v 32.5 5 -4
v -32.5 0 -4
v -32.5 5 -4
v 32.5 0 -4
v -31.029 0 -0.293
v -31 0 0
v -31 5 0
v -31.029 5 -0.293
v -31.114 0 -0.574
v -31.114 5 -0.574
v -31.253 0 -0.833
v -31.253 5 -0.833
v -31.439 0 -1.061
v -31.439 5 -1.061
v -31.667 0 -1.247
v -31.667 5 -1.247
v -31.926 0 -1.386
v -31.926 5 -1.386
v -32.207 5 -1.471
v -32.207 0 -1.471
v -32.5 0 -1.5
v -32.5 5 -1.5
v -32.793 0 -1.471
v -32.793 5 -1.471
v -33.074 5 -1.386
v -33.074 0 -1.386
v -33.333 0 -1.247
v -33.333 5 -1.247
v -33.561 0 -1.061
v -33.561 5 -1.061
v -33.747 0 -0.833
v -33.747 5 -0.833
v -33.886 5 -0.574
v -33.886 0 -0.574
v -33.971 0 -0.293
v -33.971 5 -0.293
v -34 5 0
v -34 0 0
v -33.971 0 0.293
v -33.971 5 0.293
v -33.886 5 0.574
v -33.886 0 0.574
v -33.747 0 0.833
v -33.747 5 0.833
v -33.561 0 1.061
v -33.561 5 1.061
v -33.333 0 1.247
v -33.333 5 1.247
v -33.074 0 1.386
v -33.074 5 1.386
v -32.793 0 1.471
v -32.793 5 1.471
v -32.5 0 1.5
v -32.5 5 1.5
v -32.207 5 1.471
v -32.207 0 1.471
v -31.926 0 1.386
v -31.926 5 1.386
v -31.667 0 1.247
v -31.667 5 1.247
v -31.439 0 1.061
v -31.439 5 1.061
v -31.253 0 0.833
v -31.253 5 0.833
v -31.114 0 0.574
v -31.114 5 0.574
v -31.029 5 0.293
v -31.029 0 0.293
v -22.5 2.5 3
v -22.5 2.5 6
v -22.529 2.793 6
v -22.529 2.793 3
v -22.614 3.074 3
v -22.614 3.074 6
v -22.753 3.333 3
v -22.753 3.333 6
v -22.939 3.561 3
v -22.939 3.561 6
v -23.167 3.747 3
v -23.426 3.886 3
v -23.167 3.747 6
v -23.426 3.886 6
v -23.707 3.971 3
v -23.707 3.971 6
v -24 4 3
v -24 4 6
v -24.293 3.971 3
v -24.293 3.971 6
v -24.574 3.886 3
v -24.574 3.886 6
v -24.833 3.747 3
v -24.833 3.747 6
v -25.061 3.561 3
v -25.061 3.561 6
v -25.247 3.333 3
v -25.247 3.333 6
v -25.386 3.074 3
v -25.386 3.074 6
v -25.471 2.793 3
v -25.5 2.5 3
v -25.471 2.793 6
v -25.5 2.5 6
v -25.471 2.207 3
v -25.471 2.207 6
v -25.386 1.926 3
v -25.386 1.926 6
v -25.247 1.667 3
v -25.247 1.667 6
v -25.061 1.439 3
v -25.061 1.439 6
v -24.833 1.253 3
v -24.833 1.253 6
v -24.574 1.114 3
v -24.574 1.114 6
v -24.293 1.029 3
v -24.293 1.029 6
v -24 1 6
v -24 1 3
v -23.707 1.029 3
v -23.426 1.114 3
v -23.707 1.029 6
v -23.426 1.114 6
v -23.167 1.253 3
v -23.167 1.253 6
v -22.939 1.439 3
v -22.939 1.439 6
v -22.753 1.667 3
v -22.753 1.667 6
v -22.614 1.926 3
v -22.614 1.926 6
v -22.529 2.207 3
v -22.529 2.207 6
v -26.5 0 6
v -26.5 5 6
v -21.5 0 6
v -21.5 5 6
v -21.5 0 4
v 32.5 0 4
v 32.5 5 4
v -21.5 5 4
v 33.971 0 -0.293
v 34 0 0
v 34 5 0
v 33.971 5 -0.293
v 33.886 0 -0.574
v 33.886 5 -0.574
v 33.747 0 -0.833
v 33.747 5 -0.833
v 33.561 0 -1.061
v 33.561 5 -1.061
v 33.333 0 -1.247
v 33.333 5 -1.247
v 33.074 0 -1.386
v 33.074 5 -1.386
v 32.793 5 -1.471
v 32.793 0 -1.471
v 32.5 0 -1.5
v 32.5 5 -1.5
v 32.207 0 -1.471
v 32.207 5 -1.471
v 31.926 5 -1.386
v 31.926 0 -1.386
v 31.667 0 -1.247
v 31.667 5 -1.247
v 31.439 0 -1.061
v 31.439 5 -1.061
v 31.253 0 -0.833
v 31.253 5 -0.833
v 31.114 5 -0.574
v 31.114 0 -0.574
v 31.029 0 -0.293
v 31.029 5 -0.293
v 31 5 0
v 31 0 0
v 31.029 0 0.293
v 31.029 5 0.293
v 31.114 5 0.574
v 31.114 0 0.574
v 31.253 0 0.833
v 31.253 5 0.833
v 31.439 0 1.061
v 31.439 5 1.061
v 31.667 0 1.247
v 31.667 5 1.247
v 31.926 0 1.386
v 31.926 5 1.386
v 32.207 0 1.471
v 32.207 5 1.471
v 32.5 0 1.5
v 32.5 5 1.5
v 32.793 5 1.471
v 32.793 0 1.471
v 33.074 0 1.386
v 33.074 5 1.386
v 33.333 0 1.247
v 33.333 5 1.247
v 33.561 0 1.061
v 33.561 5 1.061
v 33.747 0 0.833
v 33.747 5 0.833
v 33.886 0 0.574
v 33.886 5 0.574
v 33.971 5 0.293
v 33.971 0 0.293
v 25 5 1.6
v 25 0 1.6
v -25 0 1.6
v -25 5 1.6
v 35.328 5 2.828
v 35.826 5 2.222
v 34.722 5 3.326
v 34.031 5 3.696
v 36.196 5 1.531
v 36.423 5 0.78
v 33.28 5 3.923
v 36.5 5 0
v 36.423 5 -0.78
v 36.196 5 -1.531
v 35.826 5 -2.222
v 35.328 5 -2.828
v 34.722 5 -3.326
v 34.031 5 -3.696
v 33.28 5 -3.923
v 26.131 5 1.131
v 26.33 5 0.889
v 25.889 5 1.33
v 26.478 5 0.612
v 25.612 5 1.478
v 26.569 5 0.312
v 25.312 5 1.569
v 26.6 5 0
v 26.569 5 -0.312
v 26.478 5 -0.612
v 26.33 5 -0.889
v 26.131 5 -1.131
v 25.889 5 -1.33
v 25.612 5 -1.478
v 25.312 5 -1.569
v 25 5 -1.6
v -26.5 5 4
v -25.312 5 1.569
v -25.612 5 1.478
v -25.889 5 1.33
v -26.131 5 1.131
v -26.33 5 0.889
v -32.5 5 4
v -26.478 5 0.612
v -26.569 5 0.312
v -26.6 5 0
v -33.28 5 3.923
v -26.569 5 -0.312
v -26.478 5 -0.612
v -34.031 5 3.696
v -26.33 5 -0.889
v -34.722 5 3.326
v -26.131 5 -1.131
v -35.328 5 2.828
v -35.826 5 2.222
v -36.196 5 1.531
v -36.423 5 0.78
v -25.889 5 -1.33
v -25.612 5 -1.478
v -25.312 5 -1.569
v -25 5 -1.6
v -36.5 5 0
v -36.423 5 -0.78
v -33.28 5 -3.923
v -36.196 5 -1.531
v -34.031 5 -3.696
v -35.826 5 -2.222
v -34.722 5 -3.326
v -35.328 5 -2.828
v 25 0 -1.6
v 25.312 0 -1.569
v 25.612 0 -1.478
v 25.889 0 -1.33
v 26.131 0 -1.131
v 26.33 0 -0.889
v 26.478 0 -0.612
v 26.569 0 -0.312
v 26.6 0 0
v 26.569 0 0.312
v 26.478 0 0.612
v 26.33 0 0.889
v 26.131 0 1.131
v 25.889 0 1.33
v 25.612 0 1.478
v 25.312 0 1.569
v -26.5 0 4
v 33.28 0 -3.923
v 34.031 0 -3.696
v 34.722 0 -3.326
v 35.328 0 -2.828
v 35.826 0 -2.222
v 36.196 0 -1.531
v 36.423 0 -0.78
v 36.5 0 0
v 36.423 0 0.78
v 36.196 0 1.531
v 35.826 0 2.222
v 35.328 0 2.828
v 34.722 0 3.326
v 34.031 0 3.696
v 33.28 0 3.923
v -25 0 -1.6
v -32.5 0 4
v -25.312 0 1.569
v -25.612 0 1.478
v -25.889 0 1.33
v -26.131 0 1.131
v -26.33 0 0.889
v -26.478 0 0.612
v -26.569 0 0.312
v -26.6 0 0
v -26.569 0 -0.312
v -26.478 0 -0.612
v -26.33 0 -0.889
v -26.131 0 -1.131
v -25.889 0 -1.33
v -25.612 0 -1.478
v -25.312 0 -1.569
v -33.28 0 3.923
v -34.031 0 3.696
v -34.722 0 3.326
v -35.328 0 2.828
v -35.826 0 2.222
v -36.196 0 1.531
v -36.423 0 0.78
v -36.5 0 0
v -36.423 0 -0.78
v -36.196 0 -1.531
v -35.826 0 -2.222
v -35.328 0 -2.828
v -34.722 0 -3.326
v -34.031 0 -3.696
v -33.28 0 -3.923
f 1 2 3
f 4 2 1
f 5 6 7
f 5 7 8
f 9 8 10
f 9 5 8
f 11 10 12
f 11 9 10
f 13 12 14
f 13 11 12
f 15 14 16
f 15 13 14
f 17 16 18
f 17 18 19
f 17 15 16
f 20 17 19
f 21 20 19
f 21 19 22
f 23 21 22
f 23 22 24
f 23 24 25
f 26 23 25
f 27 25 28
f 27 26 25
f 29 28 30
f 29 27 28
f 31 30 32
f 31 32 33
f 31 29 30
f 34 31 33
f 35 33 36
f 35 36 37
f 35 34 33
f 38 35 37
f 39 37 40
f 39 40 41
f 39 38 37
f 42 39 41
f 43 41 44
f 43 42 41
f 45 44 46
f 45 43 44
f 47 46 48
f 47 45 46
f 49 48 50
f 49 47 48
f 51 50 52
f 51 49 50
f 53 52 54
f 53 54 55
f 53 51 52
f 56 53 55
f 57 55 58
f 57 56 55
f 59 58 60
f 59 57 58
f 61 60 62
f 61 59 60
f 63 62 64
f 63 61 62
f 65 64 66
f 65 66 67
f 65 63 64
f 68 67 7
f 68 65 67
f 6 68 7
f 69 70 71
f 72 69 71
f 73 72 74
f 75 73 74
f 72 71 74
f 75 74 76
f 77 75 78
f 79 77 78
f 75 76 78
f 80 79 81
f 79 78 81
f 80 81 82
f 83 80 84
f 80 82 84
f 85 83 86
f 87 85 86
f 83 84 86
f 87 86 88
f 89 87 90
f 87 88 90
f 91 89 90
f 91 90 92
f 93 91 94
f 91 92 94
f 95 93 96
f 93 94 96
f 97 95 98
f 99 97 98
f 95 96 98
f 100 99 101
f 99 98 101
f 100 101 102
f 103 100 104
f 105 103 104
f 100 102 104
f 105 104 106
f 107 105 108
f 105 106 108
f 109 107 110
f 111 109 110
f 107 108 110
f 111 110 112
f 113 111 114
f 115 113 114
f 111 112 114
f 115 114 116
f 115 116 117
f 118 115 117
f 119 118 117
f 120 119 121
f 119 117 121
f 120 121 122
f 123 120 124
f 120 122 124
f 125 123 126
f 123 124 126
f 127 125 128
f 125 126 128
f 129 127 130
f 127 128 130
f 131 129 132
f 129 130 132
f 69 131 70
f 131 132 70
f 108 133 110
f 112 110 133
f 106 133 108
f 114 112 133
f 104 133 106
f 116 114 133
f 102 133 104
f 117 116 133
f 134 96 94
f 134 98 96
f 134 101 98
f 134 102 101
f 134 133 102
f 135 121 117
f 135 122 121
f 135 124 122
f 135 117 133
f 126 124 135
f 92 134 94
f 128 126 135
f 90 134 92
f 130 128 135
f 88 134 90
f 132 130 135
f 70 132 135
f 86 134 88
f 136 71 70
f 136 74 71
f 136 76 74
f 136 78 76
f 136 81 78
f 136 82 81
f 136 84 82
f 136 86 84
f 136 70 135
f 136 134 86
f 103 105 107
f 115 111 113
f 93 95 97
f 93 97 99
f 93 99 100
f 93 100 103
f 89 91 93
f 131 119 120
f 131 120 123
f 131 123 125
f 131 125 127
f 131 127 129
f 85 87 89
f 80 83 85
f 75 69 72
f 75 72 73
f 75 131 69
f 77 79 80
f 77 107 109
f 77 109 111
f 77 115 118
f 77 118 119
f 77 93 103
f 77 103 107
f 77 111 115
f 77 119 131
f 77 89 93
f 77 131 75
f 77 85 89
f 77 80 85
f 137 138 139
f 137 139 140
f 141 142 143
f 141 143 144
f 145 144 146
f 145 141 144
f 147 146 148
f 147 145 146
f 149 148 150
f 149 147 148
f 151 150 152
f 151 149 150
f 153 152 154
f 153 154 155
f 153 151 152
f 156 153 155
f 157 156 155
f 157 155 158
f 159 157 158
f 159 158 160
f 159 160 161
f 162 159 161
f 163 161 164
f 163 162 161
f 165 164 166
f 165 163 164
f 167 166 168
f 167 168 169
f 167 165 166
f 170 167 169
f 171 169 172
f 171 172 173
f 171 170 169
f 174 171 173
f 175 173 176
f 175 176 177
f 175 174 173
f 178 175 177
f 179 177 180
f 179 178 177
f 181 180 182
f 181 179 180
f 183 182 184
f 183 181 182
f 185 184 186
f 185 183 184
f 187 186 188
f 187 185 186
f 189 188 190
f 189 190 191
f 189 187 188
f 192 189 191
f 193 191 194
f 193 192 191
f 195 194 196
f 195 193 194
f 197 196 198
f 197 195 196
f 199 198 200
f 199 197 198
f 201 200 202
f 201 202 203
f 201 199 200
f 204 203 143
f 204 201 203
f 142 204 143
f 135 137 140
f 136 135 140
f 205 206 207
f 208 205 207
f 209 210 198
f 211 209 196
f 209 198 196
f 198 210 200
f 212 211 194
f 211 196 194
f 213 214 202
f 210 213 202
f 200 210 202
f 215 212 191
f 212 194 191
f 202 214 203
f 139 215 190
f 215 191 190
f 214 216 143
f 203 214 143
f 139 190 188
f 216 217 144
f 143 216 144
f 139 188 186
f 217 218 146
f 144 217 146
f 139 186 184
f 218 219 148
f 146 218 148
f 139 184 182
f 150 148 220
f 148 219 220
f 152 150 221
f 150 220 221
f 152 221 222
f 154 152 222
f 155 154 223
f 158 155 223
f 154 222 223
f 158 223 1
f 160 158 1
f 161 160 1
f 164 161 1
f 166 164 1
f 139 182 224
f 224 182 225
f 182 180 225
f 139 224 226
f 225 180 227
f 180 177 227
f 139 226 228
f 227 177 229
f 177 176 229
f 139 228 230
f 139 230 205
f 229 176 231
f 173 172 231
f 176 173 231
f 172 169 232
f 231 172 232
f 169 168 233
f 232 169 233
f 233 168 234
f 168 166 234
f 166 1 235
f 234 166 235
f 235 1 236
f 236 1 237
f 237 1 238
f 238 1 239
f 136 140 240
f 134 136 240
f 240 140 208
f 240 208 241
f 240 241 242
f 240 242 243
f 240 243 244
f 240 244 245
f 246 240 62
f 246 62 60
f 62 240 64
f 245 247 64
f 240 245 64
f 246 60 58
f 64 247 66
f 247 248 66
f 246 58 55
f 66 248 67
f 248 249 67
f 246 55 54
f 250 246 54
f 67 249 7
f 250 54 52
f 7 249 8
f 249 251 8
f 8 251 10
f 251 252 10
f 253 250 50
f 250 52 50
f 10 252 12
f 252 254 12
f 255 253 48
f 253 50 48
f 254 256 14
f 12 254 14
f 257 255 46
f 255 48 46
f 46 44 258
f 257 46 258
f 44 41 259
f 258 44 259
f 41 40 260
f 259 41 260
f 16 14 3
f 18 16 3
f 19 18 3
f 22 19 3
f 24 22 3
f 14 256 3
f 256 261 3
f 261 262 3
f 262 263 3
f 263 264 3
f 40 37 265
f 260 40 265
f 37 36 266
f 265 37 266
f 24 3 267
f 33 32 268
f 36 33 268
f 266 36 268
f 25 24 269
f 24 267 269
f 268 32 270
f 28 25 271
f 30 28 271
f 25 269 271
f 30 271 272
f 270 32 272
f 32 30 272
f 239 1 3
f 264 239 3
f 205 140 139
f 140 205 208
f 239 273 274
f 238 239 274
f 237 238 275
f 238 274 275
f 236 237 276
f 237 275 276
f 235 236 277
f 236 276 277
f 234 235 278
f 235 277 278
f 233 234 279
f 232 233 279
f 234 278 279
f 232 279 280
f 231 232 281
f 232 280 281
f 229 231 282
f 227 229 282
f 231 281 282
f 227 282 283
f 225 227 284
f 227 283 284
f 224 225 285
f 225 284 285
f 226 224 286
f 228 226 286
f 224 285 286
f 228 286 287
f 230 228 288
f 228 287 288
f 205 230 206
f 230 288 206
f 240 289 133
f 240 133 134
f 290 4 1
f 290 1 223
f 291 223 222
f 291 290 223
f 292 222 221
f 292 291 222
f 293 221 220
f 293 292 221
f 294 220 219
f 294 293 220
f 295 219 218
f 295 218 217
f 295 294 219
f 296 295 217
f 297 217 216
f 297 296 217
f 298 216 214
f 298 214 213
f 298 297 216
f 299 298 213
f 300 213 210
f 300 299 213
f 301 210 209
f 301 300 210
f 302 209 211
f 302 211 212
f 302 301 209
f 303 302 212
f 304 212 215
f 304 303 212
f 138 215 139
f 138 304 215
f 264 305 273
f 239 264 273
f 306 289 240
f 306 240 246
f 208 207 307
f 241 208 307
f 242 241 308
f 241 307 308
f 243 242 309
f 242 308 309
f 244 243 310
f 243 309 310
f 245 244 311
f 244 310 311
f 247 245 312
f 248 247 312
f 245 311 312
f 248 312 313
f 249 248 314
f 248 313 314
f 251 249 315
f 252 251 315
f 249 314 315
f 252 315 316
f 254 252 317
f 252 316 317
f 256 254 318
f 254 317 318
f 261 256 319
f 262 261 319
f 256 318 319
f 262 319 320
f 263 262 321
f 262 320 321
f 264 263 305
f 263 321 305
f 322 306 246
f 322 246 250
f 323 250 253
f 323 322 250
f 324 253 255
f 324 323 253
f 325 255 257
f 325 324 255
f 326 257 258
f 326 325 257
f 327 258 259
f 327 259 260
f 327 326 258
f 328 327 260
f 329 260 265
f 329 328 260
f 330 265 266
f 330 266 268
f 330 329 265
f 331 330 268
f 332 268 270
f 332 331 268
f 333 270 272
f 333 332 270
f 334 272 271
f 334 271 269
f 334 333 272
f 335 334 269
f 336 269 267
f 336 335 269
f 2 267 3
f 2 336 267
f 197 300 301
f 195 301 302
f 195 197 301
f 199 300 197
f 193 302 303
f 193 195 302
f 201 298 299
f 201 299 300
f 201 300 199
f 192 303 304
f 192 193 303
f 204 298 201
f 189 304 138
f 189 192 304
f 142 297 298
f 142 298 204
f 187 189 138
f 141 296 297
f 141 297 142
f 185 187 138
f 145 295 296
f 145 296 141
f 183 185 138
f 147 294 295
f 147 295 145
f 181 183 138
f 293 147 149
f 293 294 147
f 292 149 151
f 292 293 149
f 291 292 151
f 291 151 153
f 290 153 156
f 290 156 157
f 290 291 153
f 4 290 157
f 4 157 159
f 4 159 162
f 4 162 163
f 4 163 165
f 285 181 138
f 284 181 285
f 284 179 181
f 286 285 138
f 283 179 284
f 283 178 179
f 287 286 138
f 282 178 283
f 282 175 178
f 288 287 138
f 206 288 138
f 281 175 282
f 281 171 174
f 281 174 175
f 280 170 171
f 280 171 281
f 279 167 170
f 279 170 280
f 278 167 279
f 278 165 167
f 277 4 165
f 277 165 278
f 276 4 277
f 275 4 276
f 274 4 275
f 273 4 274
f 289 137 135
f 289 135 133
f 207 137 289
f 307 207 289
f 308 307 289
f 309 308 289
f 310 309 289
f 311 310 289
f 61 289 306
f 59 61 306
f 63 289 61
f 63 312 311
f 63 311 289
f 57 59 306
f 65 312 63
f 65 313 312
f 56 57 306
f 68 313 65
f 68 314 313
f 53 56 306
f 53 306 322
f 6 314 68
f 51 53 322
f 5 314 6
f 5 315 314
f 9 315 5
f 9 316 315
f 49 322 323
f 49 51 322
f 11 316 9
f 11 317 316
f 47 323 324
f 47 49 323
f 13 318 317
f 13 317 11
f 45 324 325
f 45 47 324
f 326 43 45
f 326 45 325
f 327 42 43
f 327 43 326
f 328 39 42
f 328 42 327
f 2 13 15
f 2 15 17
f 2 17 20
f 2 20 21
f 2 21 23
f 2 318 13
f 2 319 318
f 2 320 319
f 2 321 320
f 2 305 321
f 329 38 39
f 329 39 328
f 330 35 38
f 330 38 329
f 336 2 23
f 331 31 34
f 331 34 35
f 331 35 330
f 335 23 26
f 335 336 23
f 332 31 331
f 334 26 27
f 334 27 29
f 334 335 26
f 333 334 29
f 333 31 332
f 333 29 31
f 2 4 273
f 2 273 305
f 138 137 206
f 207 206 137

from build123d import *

# Parameters (mm, degrees)
SKETCH1_R           = 1.5
BOSS_EXTRUDE1_DEPTH = 5
SKETCH2_W           = 5
SKETCH2_H           = 5
BOSS_EXTRUDE2_DEPTH = 2
SKETCH3_R           = 1.5
CUT_EXTRUDE2_DEPTH  = 3


with BuildPart() as part:
    # Sketch1 → Boss-Extrude1 (new body)
    with BuildSketch(Plane(origin=(0, 0, 0), x_dir=(1, 0, 0), z_dir=(0, 1, 0))):
        with BuildLine():
            Line((-32.5, 4), (32.5, 4))
            ThreePointArc((32.5, 4), (36.5, 0), (32.5, -4))
            Line((32.5, -4), (-32.5, -4))
            ThreePointArc((-32.5, -4), (-36.5, 0), (-32.5, 4))
        make_face()
        with Locations((-32.5, 0)):
            Circle(SKETCH1_R, mode=Mode.SUBTRACT)
        with Locations((32.5, 0)):
            Circle(SKETCH1_R, mode=Mode.SUBTRACT)
        with BuildLine():
            Line((-25, 1.6), (25, 1.6))
            ThreePointArc((25, 1.6), (26.6, 0), (25, -1.6))
            Line((25, -1.6), (-25, -1.6))
            ThreePointArc((-25, -1.6), (-26.6, 0), (-25, 1.6))
        make_face(mode=Mode.SUBTRACT)
    extrude(amount=BOSS_EXTRUDE1_DEPTH)

    # Sketch2 → Boss-Extrude2 (add)
    with BuildSketch(Plane.XY.offset(4)):
        with Locations((-24, 2.5)):
            Rectangle(SKETCH2_W, SKETCH2_H)
    extrude(amount=BOSS_EXTRUDE2_DEPTH)

    # Sketch3 → Cut-Extrude2 (cut)
    with BuildSketch(Plane.XY.offset(6)):
        with Locations((-24, 2.5)):
            Circle(SKETCH3_R)
    extrude(amount=-CUT_EXTRUDE2_DEPTH, mode=Mode.SUBTRACT)


solid = part.part
